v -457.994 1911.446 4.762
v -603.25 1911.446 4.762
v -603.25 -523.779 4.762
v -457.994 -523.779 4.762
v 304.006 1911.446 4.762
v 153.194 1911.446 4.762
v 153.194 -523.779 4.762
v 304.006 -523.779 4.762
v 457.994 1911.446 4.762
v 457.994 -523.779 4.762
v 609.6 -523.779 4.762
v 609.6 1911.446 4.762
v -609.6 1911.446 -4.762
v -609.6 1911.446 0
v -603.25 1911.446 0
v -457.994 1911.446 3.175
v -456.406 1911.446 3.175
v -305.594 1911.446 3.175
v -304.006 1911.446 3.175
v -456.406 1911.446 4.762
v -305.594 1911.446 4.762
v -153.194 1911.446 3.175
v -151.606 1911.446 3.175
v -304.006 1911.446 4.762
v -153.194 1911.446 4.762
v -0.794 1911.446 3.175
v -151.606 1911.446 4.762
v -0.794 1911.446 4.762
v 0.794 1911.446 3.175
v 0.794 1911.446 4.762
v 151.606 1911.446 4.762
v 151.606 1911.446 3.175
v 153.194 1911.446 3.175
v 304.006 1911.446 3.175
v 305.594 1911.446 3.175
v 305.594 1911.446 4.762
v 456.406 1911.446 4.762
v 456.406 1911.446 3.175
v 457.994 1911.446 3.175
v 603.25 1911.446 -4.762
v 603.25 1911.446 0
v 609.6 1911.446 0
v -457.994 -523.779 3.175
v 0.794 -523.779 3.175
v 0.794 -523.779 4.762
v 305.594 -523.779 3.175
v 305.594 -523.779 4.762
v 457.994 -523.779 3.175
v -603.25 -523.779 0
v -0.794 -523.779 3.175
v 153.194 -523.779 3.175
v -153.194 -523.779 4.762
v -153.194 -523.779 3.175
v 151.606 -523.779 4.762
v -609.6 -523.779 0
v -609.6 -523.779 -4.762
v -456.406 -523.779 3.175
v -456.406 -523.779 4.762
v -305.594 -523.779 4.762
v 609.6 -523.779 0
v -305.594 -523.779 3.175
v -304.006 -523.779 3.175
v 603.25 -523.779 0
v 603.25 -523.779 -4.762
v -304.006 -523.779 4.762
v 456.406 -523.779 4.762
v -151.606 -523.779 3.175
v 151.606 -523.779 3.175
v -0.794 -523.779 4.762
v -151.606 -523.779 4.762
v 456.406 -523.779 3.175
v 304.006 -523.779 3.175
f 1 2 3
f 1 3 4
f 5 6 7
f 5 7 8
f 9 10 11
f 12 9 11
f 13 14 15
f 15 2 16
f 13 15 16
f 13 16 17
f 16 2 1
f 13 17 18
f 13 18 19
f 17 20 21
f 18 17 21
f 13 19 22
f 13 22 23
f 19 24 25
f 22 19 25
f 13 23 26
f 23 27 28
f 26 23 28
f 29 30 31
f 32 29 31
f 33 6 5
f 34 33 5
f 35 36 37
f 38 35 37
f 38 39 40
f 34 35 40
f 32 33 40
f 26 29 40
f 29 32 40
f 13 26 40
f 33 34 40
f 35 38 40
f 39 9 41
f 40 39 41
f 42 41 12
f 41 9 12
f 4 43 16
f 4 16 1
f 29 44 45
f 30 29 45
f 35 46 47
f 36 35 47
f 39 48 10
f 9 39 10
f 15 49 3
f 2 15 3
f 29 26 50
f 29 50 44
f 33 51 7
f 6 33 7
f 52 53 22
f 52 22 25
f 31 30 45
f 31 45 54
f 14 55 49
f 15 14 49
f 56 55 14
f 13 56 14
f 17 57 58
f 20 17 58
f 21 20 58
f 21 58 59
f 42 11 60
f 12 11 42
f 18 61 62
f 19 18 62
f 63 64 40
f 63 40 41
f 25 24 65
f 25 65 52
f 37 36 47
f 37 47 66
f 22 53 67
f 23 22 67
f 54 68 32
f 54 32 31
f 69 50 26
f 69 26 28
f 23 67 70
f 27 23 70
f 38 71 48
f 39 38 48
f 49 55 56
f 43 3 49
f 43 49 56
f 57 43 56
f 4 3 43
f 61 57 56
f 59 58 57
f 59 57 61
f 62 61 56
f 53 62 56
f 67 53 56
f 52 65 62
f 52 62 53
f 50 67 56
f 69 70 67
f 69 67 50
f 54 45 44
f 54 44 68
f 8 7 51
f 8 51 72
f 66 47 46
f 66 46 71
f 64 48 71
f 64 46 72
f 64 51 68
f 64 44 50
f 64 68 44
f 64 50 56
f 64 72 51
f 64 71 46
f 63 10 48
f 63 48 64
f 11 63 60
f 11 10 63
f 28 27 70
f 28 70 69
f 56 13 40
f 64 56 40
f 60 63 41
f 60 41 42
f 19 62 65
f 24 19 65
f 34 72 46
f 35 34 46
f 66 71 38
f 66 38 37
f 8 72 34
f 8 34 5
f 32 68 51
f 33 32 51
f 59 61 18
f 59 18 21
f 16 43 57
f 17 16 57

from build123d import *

# Parameters (mm, degrees)
F0_W     = 1219.2
F0_H     = 2435.225
F1_DEPTH = 4.7625
F2_W     = 6.35
F2_H     = 4.7625
F3_DEPTH = 2435.226
F4_W     = 1.5875
F4_H     = 1.5875
F5_DEPTH = 2435.226


with BuildPart() as f1:
    # F0 (on Top) → F1 (new body, symmetric)
    with BuildSketch(Plane.XY):
        with Locations((0, 693.83302)):
            Rectangle(F0_W, F0_H)
    extrude(amount=F1_DEPTH, both=True)

    # F2 (on face) → F3 (cut, through all)
    with BuildSketch(Plane.XZ.offset(523.77948)):
        with Locations((606.425, -2.38125)):
            Rectangle(F2_W, F2_H)
        with Locations((-606.425, 2.38125)):
            Rectangle(F2_W, F2_H)
    extrude(amount=-F3_DEPTH, mode=Mode.SUBTRACT)

    # F4 (on face) → F5 (cut, through all)
    with BuildSketch(Plane.XZ.offset(523.77948)):
        with Locations((-457.2, 3.96875)):
            Rectangle(F4_W, F4_H)
        with Locations((-304.8, 3.96875)):
            Rectangle(F4_W, F4_H)
        with Locations((-152.4, 3.96875)):
            Rectangle(F4_W, F4_H)
        with Locations((0, 3.96875)):
            Rectangle(F4_W, F4_H)
        with Locations((152.4, 3.96875)):
            Rectangle(F4_W, F4_H)
        with Locations((304.8, 3.96875)):
            Rectangle(F4_W, F4_H)
        with Locations((457.2, 3.96875)):
            Rectangle(F4_W, F4_H)
    extrude(amount=-F5_DEPTH, mode=Mode.SUBTRACT)


solid = f1.part
